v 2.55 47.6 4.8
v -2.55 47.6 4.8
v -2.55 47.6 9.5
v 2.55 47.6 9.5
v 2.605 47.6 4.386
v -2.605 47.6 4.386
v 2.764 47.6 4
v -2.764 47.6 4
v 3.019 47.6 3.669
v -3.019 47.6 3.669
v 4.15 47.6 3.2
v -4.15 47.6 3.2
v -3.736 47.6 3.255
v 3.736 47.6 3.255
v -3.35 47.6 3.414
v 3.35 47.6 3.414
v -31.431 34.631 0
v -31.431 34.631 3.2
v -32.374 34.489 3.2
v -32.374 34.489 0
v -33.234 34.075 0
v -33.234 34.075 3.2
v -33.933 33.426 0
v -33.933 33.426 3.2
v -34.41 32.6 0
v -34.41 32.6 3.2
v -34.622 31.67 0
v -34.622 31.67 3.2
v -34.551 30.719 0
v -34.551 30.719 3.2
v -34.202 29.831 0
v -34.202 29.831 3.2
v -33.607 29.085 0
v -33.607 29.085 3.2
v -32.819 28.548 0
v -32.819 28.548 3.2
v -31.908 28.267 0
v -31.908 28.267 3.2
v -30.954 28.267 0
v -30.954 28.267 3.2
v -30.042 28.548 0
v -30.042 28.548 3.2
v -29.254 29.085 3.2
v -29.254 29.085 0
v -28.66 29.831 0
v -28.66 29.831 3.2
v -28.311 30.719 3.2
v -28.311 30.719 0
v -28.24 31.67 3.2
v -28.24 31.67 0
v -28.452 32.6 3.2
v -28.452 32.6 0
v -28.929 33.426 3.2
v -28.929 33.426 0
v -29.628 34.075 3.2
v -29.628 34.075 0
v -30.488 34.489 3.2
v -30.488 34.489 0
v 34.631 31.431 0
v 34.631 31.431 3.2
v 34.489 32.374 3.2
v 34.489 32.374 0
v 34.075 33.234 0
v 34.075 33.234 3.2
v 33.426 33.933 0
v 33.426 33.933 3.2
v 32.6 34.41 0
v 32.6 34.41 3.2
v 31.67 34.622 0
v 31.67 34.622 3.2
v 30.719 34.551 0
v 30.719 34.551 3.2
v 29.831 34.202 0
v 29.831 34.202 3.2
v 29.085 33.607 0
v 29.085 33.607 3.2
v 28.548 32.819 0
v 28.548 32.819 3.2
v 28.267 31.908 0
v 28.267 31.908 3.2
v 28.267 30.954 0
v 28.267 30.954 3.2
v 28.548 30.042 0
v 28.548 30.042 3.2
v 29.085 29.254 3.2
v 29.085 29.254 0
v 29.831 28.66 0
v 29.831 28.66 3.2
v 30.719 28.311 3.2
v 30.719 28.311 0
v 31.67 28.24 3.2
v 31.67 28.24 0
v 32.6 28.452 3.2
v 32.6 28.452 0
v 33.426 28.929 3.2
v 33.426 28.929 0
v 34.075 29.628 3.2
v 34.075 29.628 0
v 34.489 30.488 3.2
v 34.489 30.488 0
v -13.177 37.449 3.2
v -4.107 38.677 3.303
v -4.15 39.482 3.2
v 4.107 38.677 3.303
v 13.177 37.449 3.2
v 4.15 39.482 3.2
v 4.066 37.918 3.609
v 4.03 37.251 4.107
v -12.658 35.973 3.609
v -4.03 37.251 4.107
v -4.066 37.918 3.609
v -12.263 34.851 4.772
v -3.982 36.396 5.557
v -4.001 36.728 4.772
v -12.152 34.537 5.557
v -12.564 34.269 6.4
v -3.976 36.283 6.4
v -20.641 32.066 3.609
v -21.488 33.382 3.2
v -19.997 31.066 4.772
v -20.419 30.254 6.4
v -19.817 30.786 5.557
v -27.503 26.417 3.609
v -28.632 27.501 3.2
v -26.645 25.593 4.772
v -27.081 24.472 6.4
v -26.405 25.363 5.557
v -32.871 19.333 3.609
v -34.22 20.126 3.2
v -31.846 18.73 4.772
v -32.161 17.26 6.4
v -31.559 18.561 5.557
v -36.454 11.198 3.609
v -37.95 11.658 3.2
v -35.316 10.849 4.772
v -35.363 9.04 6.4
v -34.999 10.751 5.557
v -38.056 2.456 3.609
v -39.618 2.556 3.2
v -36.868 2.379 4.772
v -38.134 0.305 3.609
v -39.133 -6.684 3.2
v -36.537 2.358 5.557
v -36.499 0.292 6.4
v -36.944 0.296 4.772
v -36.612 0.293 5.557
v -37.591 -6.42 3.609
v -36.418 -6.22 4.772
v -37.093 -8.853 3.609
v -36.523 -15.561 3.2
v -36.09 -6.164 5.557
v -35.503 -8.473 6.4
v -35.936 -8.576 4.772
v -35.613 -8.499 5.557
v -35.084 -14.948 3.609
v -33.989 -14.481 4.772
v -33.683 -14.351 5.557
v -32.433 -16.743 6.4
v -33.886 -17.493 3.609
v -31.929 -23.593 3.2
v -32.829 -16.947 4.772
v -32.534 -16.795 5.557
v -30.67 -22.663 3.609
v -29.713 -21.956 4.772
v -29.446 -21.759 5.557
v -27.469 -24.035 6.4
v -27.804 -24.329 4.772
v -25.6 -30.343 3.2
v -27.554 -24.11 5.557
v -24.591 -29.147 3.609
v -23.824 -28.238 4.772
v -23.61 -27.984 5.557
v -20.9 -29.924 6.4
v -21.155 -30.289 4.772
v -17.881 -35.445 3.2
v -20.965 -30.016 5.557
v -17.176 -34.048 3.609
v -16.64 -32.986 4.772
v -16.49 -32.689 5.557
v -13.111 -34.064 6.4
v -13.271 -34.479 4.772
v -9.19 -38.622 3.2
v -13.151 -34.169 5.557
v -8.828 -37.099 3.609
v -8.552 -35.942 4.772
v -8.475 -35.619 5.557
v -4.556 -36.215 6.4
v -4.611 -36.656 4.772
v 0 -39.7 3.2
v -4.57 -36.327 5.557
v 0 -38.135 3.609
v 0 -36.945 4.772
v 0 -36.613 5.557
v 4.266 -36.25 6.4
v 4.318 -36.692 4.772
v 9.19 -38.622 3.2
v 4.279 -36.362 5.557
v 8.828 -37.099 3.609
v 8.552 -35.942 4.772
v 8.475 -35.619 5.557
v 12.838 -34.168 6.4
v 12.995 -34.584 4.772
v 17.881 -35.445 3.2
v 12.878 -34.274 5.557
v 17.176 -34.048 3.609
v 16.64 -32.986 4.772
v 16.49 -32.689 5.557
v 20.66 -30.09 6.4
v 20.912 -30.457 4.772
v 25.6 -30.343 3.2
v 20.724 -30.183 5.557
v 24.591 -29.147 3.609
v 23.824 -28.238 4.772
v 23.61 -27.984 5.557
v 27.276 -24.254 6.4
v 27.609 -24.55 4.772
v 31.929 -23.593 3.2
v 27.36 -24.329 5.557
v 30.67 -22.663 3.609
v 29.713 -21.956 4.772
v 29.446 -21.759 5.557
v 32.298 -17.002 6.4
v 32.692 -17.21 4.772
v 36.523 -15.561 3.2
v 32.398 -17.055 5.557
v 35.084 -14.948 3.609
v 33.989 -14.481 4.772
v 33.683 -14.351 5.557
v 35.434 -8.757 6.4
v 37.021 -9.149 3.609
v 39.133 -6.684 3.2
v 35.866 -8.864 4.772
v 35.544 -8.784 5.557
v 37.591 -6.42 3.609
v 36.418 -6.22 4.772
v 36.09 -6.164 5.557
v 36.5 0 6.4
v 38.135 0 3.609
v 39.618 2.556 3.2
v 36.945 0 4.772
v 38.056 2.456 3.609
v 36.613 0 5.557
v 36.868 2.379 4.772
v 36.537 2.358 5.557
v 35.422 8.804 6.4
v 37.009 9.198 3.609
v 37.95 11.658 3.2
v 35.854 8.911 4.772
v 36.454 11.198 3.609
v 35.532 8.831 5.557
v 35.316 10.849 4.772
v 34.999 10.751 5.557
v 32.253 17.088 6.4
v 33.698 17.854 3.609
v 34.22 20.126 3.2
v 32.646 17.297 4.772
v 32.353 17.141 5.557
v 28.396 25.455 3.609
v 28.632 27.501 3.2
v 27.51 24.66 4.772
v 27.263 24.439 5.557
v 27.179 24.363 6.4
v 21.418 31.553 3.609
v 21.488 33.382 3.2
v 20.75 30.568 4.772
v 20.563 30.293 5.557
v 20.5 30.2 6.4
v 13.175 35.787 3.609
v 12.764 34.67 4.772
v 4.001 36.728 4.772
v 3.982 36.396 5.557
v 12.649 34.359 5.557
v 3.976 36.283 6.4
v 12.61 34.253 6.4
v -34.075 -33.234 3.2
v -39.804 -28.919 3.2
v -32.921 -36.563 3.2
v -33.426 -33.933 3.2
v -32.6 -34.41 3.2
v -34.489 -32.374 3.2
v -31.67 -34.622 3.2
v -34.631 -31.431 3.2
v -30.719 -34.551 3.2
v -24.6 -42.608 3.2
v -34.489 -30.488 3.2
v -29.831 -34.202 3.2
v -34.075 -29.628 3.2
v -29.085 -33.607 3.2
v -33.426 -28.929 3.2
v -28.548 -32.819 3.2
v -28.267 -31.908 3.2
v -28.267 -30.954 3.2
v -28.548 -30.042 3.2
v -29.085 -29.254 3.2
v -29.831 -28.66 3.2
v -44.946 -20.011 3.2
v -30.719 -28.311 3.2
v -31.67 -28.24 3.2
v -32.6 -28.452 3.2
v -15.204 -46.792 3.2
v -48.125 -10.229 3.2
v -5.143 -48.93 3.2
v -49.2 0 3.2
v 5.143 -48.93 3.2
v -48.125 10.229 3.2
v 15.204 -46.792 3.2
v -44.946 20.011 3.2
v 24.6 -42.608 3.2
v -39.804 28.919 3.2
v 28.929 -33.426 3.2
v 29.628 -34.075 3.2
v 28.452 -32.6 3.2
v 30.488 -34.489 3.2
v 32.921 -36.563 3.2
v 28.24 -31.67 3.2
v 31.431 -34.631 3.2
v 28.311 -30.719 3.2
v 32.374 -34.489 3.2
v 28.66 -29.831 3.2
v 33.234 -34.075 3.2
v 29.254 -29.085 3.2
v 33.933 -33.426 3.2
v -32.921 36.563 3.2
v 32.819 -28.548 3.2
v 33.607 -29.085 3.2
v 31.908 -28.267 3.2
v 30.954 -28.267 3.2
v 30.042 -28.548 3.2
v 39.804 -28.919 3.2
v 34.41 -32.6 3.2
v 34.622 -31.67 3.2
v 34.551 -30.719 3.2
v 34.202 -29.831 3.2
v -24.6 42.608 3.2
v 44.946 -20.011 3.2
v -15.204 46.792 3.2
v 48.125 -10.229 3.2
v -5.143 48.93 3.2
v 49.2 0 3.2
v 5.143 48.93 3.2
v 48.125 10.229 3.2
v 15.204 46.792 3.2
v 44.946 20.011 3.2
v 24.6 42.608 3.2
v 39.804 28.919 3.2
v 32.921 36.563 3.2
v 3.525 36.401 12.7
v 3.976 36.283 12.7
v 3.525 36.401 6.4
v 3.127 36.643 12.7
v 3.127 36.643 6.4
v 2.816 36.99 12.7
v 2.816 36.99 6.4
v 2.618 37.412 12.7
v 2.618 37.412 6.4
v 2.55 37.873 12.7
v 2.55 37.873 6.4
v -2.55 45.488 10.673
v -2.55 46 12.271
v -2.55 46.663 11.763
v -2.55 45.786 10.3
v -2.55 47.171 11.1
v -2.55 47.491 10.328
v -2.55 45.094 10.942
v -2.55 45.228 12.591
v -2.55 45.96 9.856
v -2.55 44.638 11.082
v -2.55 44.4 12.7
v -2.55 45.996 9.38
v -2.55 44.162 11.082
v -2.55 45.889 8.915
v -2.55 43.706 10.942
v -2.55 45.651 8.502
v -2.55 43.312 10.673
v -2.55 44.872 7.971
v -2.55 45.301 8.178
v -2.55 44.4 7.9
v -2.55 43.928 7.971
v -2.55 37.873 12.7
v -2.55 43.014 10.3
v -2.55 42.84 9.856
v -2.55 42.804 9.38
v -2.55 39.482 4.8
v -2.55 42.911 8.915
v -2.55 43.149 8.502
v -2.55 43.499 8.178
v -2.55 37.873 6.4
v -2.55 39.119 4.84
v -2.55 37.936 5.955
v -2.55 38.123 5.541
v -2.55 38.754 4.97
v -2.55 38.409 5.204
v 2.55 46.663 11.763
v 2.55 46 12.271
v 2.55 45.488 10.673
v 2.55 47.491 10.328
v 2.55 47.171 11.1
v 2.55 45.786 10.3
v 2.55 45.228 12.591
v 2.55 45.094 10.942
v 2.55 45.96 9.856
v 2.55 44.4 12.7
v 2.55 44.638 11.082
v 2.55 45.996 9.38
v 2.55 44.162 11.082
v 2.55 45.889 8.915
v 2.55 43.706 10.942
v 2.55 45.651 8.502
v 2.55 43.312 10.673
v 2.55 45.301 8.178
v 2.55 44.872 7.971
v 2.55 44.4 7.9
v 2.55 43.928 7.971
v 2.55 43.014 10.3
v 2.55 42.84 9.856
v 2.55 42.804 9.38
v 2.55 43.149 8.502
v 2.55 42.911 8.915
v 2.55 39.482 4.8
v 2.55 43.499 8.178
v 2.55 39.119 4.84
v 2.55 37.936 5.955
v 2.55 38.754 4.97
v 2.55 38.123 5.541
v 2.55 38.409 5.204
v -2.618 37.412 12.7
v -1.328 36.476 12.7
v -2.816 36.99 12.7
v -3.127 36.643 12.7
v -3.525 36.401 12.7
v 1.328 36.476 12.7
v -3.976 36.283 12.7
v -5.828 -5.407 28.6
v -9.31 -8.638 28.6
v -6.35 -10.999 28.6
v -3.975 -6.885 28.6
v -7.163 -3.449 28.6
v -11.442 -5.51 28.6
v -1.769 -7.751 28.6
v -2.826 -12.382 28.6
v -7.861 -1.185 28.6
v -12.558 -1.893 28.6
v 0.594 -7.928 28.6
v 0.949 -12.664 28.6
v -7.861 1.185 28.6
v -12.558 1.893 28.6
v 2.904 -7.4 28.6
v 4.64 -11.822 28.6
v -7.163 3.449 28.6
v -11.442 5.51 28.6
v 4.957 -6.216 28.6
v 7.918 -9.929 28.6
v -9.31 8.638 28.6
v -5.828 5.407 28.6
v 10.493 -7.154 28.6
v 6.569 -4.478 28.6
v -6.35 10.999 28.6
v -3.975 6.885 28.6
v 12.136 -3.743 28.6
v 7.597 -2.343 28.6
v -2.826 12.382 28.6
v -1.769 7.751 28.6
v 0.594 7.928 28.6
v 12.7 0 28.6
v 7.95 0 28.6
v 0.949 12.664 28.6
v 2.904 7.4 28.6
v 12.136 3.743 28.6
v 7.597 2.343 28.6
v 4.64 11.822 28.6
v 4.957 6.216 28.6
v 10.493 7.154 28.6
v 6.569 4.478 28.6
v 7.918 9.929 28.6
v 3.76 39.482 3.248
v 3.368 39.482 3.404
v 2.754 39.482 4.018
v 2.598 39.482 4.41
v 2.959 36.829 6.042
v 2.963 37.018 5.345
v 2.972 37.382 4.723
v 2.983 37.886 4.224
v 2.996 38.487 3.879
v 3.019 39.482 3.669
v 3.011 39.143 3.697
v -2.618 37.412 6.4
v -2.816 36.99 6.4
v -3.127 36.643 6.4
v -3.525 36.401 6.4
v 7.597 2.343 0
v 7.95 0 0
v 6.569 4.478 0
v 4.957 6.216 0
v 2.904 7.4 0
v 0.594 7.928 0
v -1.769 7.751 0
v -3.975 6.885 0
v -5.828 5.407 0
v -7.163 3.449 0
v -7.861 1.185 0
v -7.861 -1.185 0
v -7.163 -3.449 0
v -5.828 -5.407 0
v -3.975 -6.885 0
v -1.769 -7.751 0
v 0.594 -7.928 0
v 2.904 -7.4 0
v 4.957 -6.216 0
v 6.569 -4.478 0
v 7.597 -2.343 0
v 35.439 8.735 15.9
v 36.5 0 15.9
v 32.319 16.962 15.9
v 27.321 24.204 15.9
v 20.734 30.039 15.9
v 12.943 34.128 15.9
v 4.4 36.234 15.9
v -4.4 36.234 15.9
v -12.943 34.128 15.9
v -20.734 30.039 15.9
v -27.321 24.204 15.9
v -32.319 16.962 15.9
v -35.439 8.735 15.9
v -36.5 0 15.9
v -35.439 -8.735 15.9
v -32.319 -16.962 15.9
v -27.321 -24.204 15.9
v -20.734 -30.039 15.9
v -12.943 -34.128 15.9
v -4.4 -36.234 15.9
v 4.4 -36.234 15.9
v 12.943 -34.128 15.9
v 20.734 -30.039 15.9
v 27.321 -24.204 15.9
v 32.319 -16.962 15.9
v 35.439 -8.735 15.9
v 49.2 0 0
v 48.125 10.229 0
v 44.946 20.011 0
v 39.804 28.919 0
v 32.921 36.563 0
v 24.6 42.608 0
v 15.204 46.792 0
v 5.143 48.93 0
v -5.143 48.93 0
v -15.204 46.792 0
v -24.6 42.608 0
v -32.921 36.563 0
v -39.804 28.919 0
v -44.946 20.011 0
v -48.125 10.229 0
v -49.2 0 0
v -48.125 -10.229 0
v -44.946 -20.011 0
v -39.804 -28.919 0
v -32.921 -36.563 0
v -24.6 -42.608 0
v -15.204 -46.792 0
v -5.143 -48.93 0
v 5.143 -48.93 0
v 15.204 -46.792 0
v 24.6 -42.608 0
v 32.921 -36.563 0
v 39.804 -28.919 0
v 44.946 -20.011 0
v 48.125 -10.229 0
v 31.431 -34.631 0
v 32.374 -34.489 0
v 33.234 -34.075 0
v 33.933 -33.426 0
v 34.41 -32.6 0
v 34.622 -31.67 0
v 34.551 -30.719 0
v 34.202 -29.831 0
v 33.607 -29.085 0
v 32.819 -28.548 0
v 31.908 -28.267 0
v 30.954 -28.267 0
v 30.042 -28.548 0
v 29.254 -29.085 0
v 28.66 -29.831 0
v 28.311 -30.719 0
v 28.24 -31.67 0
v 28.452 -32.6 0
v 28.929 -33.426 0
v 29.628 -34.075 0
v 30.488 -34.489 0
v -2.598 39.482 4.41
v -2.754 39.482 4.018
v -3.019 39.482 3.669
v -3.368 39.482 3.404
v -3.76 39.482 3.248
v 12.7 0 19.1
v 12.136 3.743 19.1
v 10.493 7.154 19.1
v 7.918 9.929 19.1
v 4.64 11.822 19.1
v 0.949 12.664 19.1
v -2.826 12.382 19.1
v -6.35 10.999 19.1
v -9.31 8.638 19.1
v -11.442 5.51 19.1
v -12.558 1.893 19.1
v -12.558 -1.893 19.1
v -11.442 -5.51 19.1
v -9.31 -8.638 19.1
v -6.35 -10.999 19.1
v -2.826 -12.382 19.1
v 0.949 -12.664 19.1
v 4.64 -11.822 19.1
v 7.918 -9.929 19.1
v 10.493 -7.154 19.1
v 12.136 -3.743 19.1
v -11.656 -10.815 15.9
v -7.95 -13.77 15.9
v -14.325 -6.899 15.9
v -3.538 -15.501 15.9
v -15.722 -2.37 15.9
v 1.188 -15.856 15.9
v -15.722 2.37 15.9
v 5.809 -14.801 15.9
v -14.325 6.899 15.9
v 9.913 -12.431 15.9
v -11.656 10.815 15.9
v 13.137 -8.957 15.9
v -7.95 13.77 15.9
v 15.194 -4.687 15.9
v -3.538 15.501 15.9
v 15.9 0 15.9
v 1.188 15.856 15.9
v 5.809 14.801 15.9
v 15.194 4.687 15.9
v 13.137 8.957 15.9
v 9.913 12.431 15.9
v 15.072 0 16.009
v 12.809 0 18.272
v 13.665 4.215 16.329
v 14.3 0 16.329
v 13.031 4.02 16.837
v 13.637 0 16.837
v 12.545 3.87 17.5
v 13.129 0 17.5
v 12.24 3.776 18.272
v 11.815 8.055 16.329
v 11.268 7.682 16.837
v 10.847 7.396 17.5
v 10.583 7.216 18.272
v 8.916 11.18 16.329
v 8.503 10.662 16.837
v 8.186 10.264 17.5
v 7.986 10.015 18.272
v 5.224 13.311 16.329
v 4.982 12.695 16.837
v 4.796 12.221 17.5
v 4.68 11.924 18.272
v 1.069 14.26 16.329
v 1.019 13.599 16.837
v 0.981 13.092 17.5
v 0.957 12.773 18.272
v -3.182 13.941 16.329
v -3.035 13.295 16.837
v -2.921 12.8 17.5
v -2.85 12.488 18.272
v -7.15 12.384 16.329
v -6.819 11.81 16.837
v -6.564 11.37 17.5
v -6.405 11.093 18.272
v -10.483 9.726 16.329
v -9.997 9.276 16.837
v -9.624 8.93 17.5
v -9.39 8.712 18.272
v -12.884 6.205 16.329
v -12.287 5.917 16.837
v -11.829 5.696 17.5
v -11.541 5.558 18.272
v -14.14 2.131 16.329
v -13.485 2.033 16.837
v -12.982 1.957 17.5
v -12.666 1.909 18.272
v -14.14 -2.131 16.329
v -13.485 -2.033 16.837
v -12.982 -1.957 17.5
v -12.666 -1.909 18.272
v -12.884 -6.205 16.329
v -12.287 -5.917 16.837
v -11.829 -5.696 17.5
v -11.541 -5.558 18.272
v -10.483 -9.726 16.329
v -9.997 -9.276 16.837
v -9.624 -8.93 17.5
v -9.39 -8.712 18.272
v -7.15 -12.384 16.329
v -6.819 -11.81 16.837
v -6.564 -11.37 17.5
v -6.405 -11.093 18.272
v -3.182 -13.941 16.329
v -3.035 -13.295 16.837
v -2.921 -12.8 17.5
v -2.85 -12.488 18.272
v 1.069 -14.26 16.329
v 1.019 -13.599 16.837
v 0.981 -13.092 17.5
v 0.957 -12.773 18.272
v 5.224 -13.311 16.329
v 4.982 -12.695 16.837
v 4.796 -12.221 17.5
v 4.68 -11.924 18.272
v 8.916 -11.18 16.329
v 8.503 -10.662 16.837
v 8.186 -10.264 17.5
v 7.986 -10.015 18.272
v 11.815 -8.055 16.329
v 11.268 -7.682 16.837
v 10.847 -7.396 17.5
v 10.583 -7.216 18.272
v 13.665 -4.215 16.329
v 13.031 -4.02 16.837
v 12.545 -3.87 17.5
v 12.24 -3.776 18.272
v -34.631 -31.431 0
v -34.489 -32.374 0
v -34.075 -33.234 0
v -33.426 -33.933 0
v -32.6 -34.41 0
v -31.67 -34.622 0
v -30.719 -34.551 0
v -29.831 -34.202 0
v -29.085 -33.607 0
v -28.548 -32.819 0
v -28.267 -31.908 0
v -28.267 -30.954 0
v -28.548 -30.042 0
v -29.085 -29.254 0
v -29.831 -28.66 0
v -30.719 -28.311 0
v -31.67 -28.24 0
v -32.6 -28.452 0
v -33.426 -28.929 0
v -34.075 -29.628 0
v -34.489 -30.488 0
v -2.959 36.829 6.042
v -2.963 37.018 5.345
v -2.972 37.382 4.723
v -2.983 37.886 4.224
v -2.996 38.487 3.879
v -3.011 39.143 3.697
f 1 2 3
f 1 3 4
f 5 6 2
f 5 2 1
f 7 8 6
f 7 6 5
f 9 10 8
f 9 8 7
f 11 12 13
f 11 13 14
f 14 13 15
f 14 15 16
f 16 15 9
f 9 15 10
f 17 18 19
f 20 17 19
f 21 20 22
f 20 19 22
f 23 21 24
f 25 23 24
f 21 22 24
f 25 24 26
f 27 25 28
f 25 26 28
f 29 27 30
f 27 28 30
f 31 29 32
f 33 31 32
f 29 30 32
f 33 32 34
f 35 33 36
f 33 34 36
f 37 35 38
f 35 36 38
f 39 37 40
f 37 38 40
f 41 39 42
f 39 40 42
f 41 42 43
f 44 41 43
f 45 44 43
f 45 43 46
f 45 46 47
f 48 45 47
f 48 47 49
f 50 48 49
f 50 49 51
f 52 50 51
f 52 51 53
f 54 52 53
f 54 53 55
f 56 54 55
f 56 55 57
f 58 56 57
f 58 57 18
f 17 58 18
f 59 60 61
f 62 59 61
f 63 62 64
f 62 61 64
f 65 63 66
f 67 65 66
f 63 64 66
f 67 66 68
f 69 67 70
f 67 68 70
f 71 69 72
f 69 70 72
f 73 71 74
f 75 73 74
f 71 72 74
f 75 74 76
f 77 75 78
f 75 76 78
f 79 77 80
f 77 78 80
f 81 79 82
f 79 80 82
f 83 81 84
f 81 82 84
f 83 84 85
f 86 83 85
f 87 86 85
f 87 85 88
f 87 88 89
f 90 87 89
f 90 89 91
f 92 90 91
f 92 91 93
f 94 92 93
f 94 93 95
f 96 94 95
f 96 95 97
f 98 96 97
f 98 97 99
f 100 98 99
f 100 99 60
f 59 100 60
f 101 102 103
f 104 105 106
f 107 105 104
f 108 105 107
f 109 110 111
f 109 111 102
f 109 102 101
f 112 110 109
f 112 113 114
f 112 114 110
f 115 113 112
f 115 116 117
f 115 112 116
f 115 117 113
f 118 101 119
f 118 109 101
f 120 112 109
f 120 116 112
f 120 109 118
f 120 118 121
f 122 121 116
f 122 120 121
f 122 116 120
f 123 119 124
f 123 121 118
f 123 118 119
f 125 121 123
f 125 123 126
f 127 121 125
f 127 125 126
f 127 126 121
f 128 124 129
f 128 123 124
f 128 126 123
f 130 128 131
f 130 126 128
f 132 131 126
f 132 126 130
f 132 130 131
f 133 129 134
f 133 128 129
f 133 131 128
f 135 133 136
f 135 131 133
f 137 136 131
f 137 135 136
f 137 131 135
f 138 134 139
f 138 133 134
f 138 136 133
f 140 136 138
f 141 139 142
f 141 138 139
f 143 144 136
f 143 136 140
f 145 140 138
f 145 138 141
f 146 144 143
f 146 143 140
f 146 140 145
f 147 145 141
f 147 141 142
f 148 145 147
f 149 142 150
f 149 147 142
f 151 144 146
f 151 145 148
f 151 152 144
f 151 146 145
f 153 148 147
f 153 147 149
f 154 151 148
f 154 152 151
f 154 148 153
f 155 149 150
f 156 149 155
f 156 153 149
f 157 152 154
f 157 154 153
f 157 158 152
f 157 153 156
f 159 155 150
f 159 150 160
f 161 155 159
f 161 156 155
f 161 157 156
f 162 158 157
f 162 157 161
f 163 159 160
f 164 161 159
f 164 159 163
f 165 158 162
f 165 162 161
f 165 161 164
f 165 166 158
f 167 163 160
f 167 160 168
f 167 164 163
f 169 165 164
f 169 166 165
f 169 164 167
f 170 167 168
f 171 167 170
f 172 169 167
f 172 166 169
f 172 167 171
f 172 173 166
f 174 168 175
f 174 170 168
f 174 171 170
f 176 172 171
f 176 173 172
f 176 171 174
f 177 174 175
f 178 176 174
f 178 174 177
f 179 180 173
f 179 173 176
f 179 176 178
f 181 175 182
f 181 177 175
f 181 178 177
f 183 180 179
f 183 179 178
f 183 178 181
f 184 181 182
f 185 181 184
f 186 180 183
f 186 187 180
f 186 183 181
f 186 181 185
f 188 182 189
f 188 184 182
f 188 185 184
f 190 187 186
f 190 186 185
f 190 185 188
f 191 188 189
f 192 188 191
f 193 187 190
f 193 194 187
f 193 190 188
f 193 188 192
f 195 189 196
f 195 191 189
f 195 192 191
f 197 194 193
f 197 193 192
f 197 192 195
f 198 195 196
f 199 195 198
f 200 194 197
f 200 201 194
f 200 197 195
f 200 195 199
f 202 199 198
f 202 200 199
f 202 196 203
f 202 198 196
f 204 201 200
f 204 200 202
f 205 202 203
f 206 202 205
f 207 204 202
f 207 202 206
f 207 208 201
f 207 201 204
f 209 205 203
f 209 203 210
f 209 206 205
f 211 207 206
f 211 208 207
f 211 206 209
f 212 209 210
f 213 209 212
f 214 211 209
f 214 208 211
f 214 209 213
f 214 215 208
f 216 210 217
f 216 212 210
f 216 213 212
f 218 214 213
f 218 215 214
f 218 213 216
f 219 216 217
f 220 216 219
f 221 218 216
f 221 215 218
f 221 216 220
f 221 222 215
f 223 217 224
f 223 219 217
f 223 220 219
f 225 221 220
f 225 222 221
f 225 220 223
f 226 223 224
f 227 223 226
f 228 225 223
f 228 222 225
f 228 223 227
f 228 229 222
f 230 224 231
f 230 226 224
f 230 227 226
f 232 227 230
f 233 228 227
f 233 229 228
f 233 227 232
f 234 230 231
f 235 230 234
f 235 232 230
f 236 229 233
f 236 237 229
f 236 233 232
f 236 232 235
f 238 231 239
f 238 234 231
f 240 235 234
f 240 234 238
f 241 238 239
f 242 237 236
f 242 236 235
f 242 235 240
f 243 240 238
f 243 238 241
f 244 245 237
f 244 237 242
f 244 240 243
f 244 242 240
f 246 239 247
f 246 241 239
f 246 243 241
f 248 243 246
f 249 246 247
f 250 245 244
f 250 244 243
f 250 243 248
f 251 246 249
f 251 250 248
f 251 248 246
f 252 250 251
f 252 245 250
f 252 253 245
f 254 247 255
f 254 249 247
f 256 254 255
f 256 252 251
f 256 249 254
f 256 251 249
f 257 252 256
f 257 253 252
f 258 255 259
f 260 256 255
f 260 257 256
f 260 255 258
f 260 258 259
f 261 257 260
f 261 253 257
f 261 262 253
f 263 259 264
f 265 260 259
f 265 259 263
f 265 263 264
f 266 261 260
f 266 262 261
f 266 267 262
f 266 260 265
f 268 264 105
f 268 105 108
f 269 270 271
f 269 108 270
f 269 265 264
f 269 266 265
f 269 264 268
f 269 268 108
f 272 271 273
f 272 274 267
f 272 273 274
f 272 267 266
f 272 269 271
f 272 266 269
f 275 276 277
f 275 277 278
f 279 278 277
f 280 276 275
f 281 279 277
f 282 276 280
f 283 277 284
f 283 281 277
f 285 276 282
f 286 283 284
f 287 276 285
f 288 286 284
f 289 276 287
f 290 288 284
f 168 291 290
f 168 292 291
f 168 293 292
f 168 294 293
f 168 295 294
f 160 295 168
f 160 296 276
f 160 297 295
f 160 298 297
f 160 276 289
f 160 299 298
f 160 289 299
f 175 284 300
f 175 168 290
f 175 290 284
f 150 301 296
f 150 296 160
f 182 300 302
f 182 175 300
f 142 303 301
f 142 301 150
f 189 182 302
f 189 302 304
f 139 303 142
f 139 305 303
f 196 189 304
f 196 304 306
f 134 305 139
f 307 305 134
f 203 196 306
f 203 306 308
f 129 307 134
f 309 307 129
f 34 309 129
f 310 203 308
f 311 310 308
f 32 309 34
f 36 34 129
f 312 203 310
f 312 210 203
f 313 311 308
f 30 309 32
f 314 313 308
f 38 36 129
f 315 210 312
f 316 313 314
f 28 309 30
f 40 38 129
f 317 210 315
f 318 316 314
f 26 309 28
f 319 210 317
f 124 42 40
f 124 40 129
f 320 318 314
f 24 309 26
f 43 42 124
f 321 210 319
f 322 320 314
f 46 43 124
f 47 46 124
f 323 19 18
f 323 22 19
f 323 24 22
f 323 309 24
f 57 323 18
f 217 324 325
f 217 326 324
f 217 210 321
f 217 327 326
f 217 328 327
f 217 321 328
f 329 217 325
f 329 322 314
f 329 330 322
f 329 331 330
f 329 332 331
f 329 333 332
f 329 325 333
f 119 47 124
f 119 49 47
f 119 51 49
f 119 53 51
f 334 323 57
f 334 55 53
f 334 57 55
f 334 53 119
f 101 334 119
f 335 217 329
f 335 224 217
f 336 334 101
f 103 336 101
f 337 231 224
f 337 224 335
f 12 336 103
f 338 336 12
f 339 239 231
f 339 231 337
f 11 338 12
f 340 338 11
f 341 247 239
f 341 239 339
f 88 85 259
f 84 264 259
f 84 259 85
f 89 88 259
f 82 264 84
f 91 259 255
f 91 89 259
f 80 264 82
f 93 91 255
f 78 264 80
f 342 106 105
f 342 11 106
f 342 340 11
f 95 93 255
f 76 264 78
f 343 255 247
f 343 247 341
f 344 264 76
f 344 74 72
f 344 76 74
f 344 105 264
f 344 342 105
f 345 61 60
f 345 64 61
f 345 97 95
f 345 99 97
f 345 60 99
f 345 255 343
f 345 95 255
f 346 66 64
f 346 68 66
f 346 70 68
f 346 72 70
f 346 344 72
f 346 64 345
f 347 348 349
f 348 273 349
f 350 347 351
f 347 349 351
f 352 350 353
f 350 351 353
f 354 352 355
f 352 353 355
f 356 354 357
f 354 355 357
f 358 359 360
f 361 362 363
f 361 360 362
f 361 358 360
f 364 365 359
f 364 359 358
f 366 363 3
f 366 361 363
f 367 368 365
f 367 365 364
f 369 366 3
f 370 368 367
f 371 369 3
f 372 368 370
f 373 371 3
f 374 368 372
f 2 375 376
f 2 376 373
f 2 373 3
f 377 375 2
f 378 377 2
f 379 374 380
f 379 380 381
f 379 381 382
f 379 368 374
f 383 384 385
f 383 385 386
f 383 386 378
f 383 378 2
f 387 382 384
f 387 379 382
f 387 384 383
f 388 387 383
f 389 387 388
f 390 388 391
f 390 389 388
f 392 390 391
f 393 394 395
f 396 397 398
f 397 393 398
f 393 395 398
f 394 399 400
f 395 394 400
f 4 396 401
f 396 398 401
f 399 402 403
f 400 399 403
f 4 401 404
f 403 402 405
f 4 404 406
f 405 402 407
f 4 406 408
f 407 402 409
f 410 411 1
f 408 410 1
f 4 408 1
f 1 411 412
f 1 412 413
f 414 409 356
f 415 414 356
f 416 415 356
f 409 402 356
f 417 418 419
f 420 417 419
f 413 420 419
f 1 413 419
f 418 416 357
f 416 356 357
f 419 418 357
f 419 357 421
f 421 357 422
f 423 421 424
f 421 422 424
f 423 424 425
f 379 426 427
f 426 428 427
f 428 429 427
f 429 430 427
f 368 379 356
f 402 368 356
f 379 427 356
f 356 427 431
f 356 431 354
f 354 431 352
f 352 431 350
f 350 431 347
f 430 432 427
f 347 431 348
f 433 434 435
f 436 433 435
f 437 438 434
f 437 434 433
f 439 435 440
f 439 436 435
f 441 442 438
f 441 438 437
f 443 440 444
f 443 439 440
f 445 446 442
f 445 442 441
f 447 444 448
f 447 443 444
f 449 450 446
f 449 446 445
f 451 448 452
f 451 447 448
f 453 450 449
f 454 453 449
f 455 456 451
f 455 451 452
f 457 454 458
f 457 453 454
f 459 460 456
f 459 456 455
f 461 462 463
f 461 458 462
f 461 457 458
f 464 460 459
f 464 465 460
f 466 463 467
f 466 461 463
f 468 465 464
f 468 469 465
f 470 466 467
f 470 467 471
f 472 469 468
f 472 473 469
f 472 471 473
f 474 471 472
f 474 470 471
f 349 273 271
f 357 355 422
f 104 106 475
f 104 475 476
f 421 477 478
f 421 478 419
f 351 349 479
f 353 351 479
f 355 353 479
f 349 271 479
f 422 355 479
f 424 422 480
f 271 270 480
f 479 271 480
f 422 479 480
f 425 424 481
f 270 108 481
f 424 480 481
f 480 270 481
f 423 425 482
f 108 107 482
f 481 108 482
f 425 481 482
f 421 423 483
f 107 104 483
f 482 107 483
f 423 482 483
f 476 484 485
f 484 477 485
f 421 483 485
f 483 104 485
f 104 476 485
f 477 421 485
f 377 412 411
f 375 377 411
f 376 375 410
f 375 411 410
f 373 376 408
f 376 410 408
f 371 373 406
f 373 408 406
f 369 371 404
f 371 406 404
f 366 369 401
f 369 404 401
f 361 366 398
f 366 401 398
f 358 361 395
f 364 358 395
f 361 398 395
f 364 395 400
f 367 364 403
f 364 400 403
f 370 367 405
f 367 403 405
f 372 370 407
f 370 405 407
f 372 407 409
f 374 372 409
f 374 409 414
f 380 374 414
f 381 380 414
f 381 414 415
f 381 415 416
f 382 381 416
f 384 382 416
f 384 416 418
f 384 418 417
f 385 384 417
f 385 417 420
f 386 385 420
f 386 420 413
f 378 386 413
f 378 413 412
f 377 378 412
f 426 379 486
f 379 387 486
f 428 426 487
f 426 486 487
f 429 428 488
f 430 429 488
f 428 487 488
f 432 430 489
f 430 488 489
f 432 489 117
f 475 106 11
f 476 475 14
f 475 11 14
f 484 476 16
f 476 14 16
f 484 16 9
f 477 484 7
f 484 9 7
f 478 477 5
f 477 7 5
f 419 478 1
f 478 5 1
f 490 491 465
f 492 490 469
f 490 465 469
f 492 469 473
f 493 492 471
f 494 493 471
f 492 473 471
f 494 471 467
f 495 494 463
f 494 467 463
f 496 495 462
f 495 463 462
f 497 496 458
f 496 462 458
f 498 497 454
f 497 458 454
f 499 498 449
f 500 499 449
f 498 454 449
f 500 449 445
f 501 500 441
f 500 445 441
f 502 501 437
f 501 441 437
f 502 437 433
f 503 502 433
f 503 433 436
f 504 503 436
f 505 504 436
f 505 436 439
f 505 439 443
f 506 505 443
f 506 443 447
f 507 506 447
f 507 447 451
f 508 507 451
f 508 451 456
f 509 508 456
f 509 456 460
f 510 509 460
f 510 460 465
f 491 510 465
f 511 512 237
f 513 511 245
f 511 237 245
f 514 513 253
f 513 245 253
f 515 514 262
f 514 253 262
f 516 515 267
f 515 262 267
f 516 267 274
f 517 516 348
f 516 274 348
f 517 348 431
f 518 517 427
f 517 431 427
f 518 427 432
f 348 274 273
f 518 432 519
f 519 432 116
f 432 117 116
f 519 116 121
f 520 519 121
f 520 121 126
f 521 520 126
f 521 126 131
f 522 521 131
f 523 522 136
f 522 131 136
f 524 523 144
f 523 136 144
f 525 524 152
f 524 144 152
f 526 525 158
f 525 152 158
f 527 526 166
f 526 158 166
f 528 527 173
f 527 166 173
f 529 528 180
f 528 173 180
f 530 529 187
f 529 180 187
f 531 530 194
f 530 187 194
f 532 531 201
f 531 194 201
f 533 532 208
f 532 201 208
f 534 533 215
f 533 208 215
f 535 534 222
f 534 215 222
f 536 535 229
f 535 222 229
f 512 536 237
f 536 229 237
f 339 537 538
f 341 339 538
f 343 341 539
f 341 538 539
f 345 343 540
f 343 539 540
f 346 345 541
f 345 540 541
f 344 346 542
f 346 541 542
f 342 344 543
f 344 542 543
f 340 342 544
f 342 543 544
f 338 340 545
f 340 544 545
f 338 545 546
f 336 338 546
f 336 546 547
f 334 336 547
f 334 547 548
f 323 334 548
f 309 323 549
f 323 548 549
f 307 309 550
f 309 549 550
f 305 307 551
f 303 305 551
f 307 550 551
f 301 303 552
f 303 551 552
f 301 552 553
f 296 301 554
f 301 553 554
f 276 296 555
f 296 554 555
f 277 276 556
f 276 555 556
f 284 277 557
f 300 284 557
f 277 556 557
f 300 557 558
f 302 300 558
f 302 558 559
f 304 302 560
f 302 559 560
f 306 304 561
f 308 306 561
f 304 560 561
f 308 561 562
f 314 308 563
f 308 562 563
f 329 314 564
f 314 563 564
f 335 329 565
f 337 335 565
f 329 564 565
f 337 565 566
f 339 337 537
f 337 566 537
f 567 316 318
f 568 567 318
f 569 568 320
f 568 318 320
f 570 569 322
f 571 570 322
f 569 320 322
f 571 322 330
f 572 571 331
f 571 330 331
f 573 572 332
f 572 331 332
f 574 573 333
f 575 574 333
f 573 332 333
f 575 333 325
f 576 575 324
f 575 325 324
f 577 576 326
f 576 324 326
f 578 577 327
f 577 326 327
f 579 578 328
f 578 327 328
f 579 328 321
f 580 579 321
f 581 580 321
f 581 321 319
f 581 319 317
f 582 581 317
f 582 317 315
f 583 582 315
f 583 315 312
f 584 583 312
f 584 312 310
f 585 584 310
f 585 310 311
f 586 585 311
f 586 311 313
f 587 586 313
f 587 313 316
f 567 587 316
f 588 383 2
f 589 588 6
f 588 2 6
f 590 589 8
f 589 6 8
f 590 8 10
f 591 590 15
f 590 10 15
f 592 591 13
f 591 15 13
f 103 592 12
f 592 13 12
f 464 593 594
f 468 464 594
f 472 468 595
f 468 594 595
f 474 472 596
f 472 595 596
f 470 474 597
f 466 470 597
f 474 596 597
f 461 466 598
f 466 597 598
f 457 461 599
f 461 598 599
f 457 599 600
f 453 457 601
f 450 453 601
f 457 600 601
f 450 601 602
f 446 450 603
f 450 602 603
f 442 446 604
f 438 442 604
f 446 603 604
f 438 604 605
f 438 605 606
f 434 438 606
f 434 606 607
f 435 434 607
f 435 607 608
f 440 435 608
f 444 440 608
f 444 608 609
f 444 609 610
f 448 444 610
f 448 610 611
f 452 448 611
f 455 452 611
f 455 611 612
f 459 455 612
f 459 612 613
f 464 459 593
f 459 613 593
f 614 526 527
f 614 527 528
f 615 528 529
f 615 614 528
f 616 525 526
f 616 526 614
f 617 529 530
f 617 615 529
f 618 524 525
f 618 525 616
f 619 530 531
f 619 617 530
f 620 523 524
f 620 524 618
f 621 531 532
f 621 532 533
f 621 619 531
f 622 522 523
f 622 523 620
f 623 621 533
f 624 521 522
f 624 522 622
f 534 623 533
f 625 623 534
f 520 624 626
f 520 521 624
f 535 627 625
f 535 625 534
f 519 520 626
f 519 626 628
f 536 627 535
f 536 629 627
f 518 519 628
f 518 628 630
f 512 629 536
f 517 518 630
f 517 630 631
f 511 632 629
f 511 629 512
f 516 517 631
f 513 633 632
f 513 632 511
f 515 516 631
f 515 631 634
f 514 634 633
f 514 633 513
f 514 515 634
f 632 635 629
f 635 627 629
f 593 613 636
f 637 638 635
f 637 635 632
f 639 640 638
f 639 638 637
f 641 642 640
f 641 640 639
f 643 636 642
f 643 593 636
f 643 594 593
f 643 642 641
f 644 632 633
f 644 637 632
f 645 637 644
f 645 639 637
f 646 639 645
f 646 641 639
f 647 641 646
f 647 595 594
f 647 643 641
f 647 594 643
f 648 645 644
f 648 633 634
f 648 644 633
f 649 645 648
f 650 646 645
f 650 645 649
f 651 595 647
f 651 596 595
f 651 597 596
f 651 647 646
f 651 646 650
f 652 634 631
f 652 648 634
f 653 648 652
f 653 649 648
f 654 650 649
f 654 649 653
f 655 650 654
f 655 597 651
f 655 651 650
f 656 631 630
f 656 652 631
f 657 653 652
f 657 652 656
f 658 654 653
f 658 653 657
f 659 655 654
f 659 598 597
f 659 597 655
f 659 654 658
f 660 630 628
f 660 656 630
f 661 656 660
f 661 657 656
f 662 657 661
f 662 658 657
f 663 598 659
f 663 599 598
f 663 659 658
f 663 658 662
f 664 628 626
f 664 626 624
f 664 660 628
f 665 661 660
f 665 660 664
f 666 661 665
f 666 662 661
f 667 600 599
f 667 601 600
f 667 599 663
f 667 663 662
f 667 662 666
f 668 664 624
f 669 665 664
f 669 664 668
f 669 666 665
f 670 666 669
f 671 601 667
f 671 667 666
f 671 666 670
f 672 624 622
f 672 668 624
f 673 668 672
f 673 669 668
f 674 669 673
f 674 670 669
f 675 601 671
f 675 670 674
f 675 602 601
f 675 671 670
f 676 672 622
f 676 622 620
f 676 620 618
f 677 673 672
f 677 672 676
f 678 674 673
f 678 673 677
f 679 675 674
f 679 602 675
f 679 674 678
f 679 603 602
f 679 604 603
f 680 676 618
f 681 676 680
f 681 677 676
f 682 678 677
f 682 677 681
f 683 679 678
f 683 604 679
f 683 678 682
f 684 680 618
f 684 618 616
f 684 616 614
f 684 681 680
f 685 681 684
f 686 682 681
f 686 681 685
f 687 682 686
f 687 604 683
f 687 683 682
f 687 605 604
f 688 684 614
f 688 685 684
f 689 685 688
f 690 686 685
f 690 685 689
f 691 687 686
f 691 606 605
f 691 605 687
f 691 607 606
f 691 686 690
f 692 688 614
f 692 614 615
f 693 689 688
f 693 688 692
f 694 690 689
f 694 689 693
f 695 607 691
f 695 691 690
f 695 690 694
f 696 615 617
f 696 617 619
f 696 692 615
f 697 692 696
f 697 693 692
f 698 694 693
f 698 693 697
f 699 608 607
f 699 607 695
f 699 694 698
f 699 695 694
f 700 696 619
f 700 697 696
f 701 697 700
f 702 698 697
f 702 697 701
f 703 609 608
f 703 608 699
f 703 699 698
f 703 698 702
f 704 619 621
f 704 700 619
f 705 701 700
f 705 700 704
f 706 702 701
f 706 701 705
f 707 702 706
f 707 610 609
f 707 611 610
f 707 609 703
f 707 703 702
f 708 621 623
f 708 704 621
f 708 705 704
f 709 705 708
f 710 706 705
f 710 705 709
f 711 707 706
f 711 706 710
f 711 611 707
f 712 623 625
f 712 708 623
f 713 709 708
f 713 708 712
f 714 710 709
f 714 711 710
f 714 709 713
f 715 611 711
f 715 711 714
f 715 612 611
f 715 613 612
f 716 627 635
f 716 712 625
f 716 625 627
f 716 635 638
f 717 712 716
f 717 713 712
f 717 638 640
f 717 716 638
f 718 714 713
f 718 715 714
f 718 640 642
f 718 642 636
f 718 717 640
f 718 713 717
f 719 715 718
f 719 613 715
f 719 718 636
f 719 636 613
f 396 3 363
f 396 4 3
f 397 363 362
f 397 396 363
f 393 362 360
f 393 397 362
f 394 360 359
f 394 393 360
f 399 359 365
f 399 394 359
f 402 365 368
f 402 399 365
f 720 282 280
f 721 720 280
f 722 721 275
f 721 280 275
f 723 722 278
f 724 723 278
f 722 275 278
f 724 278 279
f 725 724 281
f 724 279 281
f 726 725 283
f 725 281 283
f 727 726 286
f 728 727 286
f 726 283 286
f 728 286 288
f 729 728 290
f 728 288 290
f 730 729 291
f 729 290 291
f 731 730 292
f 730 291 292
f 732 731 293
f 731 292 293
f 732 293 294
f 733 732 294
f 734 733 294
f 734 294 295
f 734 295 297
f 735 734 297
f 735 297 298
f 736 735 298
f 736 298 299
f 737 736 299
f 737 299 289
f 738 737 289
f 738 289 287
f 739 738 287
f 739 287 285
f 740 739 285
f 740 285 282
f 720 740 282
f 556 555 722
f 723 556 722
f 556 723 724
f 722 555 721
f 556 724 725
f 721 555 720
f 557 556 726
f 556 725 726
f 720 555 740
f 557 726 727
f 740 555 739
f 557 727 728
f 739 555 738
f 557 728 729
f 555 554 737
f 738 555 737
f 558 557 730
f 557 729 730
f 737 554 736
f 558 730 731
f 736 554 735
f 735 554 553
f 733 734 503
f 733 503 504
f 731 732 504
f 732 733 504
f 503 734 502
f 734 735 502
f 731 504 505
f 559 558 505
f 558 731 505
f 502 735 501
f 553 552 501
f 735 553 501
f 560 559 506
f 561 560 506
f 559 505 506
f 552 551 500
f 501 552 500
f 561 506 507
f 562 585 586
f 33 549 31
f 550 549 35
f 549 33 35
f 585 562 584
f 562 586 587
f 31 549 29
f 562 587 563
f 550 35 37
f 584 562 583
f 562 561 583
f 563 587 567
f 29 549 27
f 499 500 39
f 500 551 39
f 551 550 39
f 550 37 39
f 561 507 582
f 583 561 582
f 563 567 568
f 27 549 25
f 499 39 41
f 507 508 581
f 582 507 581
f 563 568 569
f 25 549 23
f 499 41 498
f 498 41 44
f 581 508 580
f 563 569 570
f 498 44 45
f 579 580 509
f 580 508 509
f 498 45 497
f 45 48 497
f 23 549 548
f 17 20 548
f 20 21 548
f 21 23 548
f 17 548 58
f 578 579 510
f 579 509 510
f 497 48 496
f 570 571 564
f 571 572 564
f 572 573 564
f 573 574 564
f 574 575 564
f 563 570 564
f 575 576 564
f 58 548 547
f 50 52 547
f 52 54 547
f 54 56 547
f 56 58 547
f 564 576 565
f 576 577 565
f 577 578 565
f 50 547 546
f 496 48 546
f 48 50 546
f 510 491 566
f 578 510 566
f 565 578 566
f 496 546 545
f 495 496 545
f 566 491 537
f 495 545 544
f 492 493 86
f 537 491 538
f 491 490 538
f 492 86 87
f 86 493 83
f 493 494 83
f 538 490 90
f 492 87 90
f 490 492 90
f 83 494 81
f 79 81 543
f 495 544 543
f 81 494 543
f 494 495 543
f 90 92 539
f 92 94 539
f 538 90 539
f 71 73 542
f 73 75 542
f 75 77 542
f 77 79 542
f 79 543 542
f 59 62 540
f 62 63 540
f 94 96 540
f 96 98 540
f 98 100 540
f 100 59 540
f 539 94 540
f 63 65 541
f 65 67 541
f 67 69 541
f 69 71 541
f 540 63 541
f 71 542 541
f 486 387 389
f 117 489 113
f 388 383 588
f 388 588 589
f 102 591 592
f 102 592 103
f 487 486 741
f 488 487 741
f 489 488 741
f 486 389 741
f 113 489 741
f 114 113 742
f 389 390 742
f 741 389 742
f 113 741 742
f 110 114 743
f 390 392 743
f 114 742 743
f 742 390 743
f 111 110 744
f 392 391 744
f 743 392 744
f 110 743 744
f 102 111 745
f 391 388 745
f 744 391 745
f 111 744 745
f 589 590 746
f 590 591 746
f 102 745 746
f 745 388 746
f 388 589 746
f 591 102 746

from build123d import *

# Parameters (mm, degrees)
SKETCH1_R           = 49.2
BASE_EXTRUDE_DEPTH  = 3.2
SKETCH5_R           = 3.2
CUT_EXTRUDE2_DEPTH  = 70.652853495
CIRPATTERN1_COUNT   = 4
SKETCH2_R           = 36.5
BOSS_EXTRUDE1_DEPTH = 12.7
SKETCH3_R           = 12.7
BOSS_EXTRUDE2_DEPTH = 12.7
FILLET1_R           = 3.2
SKETCH6_W           = 5.1
SKETCH6_H           = 9.5
BOSS_EXTRUDE3_DEPTH = 47.6
SKETCH4_R           = 7.95
CUT_EXTRUDE1_DEPTH  = 76.227920349
FILLET2_R           = 3.2
CUT_EXTRUDE3_REACH  = 78.92
SKETCH7_R           = 1.6
FILLET3_R           = 1.6


with BuildPart() as part:
    # Sketch1 → Base-Extrude (new body)
    with BuildSketch(Plane.XY):
        Circle(SKETCH1_R)
    extrude(amount=BASE_EXTRUDE_DEPTH)

    # Sketch5 → Cut-Extrude2 (cut, through all)
    with BuildSketch(Plane.XY.offset(3.2)):
        with Locations((31.430896424, 31.430896424)):
            Circle(SKETCH5_R)
    cut_extrude2 = extrude(amount=-CUT_EXTRUDE2_DEPTH, mode=Mode.SUBTRACT)

    # CirPattern1: Cut-Extrude2 ×4 about axis
    cirpattern1_axis = Axis((0, 0, 0), (0, 0, 1))
    for i in range(1, CIRPATTERN1_COUNT):
        add(cut_extrude2.rotate(cirpattern1_axis, i * 360 / CIRPATTERN1_COUNT), mode=Mode.SUBTRACT)

    # Sketch2 → Boss-Extrude1 (add)
    with BuildSketch(Plane.XY.offset(3.2)):
        Circle(SKETCH2_R)
    extrude(amount=BOSS_EXTRUDE1_DEPTH)

    # Sketch3 → Boss-Extrude2 (add)
    with BuildSketch(Plane.XY.offset(15.9)):
        Circle(SKETCH3_R)
    extrude(amount=BOSS_EXTRUDE2_DEPTH)

    # Fillet1
    fillet1_edges = [part.edges().sort_by_distance(p)[0] for p in [
        (-36.5, 0, 3.2),
        (-12.7, 0, 15.9),
    ]]
    fillet(fillet1_edges, radius=FILLET1_R)

    # Sketch6 → Boss-Extrude3 (add)
    with BuildSketch(Plane(origin=(0, 0, 0), x_dir=(1, 0, 0), z_dir=(0, 1, 0))):
        with Locations((0, -7.95)):
            Rectangle(SKETCH6_W, SKETCH6_H)
    extrude(amount=BOSS_EXTRUDE3_DEPTH)

    # Sketch4 → Cut-Extrude1 (cut, through all)
    with BuildSketch(Plane.XY.offset(28.6)):
        Circle(SKETCH4_R)
    extrude(amount=-CUT_EXTRUDE1_DEPTH, mode=Mode.SUBTRACT)

    # Fillet2
    fillet2_edges = [part.edges().sort_by_distance(p)[0] for p in [
        (0, 47.6, 12.7),
    ]]
    fillet(fillet2_edges, radius=FILLET2_R)

    # Sketch7 → Cut-Extrude3 (cut, up to next)
    with BuildSketch(Plane(origin=(2.55, 0, 0), x_dir=(0, 0, -1), z_dir=(1, 0, 0)), mode=Mode.PRIVATE) as cut_extrude3_sk1:
        with Locations((-9.5, 44.4)):
            Circle(SKETCH7_R)
    cut_extrude3_tool1 = extrude(cut_extrude3_sk1.sketch, amount=-CUT_EXTRUDE3_REACH, mode=Mode.PRIVATE) & part.part
    add(cut_extrude3_tool1.solids().sort_by_distance((2.55, 44.4, 9.5))[0], mode=Mode.SUBTRACT)

    # Fillet3
    fillet3_edges = [part.edges().sort_by_distance(p)[0] for p in [
        (2.55, 43.609009945, 3.2),
        (-2.55, 36.410815701, 9.5499997),
        (-2.55, 43.609009945, 3.2),
        (2.55, 36.410815701, 9.5499997),
    ]]
    fillet(fillet3_edges, radius=FILLET3_R)


solid = part.part
